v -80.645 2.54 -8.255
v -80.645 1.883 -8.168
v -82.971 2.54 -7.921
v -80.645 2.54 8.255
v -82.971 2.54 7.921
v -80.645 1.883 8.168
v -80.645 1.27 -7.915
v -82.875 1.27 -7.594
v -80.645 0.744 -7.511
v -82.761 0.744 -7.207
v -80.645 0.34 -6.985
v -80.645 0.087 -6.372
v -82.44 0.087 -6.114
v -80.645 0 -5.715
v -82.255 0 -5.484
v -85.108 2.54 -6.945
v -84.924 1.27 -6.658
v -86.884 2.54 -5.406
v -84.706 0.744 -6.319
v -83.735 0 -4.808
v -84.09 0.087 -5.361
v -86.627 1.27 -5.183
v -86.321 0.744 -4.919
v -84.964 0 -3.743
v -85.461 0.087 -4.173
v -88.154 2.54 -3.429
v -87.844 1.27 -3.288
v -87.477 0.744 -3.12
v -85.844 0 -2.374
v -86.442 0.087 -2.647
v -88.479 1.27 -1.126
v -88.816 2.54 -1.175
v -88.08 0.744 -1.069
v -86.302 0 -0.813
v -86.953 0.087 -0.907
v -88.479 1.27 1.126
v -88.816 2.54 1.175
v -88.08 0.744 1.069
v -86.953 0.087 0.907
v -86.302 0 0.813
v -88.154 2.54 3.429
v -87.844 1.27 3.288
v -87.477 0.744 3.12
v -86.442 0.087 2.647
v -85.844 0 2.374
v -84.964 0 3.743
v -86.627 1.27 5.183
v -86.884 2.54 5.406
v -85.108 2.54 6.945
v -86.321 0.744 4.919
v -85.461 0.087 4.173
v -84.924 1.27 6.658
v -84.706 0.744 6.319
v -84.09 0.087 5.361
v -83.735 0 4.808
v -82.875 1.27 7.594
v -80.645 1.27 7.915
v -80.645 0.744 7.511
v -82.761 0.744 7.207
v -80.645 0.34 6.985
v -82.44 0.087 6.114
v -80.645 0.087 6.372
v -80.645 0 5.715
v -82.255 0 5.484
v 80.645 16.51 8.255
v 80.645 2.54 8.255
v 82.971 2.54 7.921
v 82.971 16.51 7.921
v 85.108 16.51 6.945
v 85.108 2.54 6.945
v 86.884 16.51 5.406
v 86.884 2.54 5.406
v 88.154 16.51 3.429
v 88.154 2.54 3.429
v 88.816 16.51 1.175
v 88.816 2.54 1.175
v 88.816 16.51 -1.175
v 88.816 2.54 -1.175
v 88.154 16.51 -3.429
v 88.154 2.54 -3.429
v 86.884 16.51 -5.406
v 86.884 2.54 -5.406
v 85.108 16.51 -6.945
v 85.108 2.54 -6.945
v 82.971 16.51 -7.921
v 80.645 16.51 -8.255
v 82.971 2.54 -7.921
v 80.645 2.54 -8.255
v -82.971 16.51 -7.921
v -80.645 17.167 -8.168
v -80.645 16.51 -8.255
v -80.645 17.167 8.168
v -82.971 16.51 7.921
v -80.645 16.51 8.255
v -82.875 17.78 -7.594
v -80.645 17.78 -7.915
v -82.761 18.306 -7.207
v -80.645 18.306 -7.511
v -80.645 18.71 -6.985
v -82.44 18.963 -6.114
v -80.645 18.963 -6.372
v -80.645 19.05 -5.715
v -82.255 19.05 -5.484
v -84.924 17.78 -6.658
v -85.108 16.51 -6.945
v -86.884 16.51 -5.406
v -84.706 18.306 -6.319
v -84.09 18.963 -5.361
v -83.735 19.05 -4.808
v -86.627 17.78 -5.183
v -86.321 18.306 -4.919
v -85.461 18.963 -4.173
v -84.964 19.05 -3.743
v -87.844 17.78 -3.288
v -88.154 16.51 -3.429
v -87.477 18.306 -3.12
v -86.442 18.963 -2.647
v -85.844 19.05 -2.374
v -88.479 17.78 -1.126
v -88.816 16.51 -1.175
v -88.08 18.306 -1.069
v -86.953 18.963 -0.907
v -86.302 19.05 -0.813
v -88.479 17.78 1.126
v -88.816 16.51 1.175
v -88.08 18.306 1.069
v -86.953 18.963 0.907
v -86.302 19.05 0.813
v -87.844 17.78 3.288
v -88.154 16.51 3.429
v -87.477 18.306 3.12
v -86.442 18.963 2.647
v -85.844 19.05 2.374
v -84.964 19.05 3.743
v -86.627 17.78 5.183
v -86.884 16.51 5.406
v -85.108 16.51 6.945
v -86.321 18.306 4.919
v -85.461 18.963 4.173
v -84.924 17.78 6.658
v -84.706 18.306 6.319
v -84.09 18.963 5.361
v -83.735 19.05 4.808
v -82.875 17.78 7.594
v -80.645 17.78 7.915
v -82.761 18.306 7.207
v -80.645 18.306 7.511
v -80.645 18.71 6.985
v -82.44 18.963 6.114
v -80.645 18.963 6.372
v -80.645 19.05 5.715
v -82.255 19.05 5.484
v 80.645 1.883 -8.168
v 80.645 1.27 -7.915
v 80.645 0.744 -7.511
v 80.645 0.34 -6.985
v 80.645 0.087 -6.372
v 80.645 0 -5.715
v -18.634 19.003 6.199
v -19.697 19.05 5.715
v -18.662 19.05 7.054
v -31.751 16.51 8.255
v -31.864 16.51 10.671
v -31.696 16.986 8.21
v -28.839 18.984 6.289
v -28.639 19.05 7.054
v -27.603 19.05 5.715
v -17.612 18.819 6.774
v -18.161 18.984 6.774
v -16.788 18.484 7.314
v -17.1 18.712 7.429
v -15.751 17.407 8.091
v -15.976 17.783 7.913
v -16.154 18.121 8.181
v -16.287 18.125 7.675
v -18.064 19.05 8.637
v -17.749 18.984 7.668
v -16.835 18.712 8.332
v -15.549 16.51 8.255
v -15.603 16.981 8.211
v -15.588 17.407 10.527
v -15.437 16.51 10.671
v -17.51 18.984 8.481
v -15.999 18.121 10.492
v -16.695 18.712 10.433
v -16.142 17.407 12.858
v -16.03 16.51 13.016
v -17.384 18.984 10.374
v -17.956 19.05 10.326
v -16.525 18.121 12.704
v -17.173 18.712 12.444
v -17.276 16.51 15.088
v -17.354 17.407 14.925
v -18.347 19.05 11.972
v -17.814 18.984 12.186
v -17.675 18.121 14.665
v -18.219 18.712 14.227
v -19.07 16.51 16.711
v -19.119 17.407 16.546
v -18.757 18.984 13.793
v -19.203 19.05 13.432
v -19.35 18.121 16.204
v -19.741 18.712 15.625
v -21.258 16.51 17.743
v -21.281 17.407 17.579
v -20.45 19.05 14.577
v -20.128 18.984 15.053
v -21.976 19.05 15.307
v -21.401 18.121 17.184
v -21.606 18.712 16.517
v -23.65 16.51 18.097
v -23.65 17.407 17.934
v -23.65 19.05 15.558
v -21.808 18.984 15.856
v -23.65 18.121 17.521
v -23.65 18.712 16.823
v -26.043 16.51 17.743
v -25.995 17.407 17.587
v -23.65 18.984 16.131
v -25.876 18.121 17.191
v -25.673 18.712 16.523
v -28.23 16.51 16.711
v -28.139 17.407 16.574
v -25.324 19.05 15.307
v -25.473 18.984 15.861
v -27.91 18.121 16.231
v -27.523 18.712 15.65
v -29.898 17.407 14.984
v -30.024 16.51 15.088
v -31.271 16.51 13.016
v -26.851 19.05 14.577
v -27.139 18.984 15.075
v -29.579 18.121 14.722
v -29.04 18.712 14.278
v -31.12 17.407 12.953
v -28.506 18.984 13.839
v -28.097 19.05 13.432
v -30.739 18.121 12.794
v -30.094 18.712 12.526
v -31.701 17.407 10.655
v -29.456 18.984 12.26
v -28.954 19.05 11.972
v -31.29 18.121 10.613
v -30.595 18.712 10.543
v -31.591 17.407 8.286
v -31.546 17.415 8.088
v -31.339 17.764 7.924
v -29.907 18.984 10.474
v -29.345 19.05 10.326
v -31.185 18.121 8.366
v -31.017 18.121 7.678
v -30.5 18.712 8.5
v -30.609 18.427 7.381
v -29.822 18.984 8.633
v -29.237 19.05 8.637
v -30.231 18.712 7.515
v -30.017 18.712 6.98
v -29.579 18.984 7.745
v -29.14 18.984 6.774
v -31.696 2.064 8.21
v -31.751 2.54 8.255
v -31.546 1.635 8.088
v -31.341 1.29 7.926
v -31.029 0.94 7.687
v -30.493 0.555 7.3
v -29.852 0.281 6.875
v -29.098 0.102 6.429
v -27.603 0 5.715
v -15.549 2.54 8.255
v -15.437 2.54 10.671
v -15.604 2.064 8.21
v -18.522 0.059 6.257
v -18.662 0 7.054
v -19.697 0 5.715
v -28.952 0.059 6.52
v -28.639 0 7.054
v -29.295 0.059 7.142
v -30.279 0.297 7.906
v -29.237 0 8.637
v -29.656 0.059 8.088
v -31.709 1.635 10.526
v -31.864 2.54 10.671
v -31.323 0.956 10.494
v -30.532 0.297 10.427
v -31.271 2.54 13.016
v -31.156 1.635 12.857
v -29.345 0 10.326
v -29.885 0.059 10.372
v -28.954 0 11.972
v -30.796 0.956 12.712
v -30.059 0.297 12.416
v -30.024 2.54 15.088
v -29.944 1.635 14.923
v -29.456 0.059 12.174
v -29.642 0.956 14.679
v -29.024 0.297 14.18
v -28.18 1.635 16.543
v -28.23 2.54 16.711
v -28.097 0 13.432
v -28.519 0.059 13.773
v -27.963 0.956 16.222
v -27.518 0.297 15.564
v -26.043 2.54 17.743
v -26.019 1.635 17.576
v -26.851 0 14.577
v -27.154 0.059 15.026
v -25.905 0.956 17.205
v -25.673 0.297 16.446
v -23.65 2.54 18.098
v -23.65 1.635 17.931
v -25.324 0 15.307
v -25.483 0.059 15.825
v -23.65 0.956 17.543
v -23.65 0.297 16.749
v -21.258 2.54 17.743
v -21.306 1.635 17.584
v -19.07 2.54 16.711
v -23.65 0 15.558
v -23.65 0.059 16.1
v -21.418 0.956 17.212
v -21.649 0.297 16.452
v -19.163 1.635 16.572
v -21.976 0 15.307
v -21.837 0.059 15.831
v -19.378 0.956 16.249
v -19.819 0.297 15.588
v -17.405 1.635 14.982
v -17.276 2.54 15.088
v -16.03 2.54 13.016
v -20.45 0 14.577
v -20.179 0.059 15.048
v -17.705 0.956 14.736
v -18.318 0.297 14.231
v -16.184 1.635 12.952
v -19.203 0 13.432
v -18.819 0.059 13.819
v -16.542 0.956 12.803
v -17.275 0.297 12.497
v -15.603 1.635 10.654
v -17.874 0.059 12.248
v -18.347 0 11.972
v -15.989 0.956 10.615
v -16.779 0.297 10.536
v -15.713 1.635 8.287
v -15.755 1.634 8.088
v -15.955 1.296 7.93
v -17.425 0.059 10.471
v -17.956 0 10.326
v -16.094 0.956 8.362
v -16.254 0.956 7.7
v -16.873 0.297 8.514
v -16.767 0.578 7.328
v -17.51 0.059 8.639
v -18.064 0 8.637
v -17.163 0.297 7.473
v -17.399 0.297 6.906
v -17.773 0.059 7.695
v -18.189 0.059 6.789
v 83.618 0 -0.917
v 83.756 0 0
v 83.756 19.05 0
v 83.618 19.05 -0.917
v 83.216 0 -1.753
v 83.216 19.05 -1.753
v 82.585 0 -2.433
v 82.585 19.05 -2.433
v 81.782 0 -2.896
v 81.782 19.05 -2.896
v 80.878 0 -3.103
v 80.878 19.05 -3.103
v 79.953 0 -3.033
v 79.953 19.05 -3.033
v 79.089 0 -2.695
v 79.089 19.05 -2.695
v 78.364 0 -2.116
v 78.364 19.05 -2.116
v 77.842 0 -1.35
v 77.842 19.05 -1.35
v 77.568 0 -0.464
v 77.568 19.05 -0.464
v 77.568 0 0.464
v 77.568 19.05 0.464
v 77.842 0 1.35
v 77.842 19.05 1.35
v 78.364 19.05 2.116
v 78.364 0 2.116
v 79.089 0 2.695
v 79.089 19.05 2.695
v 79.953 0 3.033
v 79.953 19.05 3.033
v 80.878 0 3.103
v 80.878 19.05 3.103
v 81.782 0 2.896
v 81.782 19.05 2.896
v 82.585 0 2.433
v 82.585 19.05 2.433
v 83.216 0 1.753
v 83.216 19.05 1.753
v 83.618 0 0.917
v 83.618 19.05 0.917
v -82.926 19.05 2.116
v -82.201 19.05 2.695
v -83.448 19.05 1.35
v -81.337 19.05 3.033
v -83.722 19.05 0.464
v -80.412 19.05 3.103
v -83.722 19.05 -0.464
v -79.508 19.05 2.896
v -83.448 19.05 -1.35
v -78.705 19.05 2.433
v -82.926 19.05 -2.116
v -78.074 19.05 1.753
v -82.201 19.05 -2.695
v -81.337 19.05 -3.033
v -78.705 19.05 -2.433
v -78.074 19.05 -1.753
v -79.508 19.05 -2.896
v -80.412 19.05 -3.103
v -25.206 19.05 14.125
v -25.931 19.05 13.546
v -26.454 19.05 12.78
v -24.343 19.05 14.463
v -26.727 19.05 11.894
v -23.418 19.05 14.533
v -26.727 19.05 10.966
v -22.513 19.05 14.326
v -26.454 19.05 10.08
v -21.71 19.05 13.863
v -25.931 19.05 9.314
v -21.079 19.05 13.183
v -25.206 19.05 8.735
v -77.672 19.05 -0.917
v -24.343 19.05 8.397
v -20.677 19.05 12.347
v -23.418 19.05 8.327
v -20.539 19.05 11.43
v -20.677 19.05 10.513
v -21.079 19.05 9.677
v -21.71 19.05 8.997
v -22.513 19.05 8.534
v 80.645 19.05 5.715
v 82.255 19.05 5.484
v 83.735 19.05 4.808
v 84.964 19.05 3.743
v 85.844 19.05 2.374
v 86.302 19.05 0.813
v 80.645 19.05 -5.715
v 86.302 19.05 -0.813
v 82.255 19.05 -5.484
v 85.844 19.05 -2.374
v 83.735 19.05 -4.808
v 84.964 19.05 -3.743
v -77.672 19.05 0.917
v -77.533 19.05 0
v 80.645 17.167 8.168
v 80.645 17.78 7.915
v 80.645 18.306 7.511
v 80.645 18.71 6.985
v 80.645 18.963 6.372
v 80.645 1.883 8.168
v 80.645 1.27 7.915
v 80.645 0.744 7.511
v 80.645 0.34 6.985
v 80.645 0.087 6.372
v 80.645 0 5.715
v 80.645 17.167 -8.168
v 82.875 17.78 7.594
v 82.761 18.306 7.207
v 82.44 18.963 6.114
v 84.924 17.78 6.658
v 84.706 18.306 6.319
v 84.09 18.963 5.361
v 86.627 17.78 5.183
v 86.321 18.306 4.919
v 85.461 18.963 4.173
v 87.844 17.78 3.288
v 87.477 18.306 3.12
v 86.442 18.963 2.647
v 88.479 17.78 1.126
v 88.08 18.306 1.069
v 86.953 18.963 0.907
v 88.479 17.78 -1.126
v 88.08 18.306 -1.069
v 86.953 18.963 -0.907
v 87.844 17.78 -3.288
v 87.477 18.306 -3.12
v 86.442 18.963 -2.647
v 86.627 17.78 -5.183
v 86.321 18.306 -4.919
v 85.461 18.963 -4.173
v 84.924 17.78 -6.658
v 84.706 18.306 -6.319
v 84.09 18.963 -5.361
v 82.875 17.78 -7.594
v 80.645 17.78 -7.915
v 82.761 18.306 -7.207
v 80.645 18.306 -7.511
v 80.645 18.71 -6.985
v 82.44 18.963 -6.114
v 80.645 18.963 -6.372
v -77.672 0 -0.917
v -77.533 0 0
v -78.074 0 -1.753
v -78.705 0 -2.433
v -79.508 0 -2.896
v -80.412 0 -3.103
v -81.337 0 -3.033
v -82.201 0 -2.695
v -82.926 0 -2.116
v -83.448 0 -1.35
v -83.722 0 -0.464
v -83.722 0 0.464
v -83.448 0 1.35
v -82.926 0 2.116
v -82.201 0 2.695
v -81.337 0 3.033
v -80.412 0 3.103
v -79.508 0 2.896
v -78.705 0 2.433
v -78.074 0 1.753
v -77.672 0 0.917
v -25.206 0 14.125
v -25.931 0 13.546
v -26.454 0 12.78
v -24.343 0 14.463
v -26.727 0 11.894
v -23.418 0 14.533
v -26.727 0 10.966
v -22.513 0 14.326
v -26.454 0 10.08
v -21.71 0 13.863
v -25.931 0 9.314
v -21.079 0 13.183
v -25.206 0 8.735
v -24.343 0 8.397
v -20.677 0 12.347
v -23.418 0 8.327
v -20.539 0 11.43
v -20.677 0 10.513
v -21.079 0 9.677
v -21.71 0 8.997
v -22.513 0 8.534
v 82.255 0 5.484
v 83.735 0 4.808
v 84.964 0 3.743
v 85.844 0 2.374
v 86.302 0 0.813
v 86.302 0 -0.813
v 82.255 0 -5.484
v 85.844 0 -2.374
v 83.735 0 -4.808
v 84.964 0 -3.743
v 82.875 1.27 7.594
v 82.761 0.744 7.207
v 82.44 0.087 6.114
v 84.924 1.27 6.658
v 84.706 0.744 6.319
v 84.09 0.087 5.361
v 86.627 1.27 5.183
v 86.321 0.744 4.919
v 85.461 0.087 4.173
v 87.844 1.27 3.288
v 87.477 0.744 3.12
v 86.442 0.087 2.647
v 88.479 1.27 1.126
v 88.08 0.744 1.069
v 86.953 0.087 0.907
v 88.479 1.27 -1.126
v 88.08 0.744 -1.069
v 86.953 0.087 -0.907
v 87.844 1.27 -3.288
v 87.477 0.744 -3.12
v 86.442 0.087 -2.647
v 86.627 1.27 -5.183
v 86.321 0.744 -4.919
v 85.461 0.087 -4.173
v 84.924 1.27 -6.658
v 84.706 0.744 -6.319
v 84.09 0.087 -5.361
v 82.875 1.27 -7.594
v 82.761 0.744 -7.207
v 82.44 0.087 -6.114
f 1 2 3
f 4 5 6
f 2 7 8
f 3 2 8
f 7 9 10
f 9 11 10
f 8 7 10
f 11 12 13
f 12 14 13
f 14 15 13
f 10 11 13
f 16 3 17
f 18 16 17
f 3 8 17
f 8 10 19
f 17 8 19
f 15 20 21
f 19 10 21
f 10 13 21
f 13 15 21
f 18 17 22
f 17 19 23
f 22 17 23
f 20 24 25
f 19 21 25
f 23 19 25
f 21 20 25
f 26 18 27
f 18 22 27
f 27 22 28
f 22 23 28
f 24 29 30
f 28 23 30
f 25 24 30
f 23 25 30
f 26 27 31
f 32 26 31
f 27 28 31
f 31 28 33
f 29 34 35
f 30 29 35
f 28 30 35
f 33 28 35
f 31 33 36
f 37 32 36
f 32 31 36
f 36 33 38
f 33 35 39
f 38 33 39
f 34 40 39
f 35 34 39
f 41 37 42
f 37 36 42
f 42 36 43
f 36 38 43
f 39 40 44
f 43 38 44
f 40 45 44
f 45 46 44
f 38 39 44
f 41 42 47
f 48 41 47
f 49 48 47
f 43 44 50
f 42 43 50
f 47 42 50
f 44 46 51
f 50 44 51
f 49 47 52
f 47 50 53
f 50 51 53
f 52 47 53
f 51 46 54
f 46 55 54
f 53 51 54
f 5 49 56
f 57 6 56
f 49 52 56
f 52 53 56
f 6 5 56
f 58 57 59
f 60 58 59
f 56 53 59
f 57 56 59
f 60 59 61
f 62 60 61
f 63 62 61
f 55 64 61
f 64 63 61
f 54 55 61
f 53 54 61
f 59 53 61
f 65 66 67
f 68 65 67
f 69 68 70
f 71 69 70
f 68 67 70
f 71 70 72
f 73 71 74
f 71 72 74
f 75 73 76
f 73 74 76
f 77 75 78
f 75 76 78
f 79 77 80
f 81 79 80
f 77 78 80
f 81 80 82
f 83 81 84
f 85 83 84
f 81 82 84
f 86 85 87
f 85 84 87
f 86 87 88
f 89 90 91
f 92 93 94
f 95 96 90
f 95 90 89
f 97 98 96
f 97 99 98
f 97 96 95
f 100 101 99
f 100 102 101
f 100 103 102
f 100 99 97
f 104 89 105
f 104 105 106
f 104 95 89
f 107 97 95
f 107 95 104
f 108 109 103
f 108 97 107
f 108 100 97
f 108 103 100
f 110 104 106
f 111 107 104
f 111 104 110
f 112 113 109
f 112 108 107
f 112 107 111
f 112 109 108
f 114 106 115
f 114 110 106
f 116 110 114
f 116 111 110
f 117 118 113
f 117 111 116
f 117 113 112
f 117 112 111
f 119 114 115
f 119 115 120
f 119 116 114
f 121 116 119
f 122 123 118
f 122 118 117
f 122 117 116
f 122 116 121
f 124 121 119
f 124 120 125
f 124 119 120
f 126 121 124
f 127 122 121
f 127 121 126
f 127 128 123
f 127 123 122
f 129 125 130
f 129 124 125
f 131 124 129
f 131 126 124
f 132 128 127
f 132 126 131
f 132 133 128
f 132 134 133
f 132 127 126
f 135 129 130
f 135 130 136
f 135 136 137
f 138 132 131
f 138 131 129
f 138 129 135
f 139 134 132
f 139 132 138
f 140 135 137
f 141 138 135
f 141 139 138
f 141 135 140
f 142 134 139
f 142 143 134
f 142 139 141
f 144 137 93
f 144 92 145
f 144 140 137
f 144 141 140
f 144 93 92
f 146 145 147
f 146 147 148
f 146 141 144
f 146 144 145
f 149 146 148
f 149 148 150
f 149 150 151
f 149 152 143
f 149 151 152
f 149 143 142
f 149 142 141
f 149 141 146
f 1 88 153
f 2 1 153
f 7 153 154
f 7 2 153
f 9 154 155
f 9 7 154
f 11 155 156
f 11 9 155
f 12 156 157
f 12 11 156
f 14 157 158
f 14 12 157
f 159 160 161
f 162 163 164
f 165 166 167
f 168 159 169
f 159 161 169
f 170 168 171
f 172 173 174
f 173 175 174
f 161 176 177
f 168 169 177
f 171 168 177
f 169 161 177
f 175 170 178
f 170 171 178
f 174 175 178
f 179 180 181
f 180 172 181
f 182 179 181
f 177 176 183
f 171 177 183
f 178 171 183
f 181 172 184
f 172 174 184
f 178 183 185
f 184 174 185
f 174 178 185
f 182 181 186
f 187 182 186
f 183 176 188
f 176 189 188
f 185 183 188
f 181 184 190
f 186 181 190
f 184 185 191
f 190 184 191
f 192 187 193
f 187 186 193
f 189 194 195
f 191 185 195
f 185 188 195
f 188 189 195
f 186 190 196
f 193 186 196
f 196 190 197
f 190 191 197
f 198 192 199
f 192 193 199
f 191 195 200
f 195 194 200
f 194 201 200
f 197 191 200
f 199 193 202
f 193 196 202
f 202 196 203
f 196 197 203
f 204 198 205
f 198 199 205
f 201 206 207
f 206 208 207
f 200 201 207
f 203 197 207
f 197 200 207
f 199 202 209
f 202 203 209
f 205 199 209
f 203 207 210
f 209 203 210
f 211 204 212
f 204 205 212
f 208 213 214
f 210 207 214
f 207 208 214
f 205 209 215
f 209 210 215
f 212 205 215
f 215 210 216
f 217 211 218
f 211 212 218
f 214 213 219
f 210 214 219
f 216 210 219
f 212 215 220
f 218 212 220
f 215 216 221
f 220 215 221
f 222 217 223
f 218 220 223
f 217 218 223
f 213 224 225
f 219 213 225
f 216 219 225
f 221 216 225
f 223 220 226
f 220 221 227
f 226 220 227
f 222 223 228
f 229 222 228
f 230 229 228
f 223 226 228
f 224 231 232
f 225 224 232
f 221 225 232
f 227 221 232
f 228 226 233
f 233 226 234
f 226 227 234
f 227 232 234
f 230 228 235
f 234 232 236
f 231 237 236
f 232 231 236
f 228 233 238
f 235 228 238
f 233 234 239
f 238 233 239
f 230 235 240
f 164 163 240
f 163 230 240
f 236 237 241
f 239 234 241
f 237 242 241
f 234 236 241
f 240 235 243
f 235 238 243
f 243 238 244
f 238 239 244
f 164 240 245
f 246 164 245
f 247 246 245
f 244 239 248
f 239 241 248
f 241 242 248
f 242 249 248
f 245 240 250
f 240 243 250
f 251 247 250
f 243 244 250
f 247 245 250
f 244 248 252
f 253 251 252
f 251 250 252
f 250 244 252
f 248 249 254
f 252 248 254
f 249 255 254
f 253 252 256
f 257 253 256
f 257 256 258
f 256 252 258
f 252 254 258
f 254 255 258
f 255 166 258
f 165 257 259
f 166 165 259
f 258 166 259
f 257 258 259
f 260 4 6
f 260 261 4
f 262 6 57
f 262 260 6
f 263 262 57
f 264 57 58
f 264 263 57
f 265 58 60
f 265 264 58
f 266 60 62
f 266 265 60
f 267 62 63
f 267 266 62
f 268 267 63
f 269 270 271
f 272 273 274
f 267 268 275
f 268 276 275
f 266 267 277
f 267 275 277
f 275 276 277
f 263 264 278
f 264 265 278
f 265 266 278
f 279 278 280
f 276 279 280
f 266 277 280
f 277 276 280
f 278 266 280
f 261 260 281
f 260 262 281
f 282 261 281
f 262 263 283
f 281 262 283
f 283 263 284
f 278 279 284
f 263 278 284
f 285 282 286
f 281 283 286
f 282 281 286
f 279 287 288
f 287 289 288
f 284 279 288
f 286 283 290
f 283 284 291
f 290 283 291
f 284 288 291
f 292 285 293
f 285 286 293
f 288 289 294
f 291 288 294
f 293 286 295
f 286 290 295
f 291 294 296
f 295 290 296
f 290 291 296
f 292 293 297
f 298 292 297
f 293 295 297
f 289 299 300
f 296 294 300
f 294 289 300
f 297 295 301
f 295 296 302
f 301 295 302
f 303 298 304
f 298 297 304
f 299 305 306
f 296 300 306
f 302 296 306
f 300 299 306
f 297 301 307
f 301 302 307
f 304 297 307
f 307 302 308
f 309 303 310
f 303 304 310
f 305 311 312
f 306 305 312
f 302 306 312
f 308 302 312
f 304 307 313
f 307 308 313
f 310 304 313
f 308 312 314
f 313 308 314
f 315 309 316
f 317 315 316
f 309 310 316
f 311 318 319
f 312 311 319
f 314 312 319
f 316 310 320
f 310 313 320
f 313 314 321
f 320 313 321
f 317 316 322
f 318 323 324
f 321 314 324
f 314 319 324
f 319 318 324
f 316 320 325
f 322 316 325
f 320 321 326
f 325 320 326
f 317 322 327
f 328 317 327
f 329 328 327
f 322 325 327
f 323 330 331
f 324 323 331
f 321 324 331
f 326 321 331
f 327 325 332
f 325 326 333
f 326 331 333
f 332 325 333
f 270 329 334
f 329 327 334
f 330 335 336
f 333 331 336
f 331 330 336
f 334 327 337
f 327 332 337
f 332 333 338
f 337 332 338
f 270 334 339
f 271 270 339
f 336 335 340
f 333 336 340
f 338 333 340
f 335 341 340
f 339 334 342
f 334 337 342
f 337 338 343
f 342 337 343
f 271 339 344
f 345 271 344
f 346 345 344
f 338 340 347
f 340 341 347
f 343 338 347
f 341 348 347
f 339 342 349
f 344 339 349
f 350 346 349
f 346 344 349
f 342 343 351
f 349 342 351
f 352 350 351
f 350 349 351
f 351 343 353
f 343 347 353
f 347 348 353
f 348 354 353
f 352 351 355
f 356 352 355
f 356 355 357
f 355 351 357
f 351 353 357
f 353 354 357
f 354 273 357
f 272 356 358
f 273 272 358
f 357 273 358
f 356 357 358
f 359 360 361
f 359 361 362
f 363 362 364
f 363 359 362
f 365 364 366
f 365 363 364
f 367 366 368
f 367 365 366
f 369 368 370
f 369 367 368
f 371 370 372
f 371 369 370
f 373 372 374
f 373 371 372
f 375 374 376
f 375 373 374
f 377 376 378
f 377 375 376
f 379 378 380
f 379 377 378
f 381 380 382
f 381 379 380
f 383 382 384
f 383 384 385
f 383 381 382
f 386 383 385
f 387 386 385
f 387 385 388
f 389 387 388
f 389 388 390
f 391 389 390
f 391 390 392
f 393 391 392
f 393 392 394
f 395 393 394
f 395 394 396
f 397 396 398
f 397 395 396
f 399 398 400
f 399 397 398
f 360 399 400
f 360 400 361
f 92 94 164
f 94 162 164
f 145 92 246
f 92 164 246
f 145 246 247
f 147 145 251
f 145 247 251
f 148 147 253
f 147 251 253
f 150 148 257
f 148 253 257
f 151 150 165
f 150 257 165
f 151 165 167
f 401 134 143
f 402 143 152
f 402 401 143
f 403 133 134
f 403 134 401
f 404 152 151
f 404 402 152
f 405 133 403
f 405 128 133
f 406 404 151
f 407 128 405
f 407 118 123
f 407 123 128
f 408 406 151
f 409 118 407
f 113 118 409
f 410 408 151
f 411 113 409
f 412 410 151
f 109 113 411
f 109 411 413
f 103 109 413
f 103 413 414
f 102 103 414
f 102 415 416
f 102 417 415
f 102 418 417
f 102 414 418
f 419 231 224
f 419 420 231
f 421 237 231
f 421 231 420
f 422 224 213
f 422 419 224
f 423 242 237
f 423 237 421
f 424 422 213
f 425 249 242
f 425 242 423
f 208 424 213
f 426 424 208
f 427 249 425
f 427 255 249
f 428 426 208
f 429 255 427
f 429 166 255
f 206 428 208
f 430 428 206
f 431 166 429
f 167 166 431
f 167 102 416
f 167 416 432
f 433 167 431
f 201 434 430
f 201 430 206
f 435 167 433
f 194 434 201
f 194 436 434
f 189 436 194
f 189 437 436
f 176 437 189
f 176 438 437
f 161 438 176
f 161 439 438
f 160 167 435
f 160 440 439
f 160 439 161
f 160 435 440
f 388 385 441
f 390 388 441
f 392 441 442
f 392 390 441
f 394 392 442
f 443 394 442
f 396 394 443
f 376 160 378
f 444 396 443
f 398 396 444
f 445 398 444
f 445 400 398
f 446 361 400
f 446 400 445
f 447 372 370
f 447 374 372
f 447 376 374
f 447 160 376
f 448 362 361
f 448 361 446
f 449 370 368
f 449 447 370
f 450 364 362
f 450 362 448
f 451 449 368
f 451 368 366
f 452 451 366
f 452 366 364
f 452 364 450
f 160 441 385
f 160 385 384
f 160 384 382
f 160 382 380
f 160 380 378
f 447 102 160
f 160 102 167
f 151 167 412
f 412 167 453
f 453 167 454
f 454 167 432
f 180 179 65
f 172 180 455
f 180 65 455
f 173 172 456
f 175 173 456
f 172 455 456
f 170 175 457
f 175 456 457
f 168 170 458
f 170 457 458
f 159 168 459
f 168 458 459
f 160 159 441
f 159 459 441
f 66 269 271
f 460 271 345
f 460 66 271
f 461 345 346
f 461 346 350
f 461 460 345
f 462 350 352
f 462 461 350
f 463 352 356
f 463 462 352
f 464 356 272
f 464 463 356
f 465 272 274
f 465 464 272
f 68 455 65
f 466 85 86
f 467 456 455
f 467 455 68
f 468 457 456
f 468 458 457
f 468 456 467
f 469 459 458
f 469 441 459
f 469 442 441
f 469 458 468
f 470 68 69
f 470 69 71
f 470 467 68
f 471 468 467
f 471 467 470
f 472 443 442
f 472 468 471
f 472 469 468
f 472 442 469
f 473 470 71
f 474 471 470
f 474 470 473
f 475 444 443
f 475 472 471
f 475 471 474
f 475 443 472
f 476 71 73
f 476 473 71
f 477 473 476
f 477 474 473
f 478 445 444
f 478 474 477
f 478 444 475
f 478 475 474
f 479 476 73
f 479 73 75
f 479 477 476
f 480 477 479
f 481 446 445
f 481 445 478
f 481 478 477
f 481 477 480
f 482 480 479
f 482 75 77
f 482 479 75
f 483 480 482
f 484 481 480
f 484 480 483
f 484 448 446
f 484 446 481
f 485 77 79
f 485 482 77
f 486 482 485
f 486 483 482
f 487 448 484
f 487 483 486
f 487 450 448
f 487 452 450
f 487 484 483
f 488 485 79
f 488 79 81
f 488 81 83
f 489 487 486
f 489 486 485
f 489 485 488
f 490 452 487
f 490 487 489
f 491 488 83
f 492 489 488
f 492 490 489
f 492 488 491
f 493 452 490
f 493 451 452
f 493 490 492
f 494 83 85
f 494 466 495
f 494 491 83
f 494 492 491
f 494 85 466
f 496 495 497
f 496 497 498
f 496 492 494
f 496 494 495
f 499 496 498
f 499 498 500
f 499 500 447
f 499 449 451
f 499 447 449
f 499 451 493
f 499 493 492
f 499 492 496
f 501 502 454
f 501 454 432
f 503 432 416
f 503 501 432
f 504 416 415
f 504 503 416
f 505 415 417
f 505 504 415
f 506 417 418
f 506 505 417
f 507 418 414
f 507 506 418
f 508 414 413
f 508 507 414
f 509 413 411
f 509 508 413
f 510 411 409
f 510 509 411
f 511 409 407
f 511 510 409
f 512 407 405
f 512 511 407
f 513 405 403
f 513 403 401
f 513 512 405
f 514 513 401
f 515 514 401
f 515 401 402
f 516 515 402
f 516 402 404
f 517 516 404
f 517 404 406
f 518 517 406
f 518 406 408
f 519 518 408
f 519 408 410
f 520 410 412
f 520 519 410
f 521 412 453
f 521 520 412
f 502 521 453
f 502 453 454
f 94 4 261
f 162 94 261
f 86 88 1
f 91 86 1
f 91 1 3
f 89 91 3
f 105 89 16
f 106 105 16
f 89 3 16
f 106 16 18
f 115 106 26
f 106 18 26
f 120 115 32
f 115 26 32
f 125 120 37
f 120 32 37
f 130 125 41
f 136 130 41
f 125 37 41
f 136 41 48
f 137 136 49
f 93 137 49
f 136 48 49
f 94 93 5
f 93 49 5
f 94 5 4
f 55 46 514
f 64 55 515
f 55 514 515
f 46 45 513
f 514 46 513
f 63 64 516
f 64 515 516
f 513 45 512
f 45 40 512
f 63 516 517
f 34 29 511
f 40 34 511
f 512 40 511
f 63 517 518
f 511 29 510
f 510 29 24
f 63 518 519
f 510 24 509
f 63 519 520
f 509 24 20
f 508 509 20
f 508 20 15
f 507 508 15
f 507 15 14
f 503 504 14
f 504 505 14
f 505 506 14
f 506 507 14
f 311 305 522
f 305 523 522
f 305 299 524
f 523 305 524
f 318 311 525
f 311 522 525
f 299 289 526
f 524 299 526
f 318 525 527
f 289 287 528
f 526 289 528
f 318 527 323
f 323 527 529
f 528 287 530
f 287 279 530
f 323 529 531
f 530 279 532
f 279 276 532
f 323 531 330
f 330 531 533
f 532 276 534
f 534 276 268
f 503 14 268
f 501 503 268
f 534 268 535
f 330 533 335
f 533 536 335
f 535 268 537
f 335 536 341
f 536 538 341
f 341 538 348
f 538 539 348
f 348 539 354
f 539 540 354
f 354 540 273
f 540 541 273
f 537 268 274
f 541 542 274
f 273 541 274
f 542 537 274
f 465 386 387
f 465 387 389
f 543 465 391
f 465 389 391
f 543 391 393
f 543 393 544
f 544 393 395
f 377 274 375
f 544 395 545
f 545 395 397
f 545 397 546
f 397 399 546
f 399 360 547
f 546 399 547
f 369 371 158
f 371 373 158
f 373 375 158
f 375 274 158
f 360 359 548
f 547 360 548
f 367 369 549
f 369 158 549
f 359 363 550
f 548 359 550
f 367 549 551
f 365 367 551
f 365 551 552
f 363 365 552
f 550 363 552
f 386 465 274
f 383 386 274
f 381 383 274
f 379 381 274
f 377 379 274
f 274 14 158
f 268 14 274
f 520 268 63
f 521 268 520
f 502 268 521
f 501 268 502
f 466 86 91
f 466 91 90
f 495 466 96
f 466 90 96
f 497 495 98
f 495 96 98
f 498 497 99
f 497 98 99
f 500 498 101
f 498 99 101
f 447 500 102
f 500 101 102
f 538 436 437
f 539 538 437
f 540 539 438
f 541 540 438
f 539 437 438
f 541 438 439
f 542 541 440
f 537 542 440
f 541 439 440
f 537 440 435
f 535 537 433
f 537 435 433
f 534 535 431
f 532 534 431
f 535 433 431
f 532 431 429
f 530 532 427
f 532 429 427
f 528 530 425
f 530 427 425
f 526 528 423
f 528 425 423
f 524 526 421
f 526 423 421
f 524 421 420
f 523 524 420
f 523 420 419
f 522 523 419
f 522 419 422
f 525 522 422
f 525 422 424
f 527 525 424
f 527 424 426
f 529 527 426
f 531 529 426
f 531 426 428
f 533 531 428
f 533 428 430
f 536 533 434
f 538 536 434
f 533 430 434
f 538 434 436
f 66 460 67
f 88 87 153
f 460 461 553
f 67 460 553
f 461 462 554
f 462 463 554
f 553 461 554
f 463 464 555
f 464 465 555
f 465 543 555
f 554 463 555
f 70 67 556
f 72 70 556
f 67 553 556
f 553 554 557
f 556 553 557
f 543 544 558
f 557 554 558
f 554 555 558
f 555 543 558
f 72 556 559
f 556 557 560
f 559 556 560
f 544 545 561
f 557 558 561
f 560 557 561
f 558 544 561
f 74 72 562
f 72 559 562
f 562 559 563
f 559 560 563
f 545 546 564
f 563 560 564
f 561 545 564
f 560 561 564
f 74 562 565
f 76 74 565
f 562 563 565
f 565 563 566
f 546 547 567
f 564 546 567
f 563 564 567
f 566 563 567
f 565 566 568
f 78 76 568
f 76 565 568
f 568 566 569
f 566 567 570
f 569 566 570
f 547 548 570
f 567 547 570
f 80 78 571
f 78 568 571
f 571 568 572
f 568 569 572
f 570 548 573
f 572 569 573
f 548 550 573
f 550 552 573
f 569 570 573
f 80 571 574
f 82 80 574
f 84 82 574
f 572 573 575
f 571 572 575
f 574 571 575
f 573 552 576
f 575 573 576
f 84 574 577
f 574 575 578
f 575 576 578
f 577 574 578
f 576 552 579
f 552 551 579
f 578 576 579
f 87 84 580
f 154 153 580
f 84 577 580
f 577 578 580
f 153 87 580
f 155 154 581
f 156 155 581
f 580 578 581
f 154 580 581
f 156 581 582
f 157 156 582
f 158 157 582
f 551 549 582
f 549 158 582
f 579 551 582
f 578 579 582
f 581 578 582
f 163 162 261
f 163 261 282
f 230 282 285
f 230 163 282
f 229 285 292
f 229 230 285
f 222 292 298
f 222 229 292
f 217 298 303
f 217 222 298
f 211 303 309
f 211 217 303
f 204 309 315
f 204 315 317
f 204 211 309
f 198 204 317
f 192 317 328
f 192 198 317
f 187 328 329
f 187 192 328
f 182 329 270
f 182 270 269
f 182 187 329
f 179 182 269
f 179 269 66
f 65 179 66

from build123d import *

# Parameters (mm, degrees)
SKETCH1_R           = 3.1115
BOSS_EXTRUDE1_DEPTH = 19.05
SKETCH2_R           = 8.255
SKETCH2_R_2         = 3.1115
BOSS_EXTRUDE2_DEPTH = 19.05
FILLET1_R           = 2.54


with BuildPart() as part:
    # Sketch1 → Boss-Extrude1 (new body)
    with BuildSketch(Plane(origin=(0, 0, 0), x_dir=(1, 0, 0), z_dir=(0, 1, 0))):
        with BuildLine():
            Line((-80.645, -8.255), (80.645, -8.255))
            ThreePointArc((80.645, -8.255), (88.9, 0), (80.645, 8.255))
            Line((80.645, 8.255), (-80.645, 8.255))
            ThreePointArc((-80.645, 8.255), (-88.9, 0), (-80.645, -8.255))
        make_face()
        with Locations((-80.645, 0)):
            Circle(SKETCH1_R, mode=Mode.SUBTRACT)
        with Locations((80.645, 0)):
            Circle(SKETCH1_R, mode=Mode.SUBTRACT)
    extrude(amount=BOSS_EXTRUDE1_DEPTH)

    # Sketch2 → Boss-Extrude2 (add)
    with BuildSketch(Plane(origin=(0, 19.05, 0), x_dir=(1, 0, 0), z_dir=(0, 1, 0))):
        with Locations((-23.650230322, -9.8425)):
            Circle(SKETCH2_R)
        with Locations((-23.650230322, -11.43)):
            Circle(SKETCH2_R_2, mode=Mode.SUBTRACT)
    extrude(amount=-BOSS_EXTRUDE2_DEPTH)

    # Fillet1
    fillet1_edges = [part.edges().sort_by_distance(p)[0] for p in [
        (88.9, 19.05, 0),
        (0, 19.05, -8.255),
        (32.547843725, 0, 8.255),
        (32.547843725, 19.05, 8.255),
        (-23.650230322, 19.05, 18.0975),
        (-23.650230322, 0, 18.0975),
        (-88.9, 19.05, 0),
        (0, 0, -8.255),
        (88.9, 0, 0),
        (-56.198074047, 0, 8.255),
        (-88.9, 0, 0),
        (-56.198074047, 19.05, 8.255),
    ]]
    fillet(fillet1_edges, radius=FILLET1_R)


solid = part.part
